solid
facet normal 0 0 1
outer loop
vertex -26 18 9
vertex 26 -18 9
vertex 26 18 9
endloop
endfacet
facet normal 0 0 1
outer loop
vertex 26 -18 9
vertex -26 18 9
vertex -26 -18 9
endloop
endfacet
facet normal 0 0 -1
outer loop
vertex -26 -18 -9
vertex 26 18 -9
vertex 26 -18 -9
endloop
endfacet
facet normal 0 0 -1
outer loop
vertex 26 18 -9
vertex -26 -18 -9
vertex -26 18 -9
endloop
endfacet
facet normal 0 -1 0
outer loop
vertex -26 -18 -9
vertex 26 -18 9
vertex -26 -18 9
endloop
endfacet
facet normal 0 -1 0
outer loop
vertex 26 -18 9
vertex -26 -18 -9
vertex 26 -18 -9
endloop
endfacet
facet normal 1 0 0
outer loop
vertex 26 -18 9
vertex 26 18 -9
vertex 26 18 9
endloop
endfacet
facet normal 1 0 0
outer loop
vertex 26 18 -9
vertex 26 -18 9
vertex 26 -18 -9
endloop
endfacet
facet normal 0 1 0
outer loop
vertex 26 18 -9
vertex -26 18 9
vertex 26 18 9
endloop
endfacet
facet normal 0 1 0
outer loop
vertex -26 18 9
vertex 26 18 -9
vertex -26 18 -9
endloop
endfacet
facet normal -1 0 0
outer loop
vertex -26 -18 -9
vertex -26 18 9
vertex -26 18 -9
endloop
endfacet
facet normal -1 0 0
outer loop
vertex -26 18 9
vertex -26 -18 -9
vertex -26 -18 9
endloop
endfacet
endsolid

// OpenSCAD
// ============================================================================
// Atom Lithography Machine — Parametric OpenSCAD Module (S6.10-01)
// ============================================================================
// part_id           : S6.10-01
// parent_bom_id     : S6.10
// subsystem         : S6
// part_name         : Yuksek-empedansli 3 kOhm NbTiN (L_sq=100 pH/sq) M4 kavite-QED veri yolu yongasi & NRE (Exp131)
// material          : OFHC Cu
// temp_stage        : 20 mK (MXC)
// vacuum_grade      : UHV / Kriyo-vakum
// tolerance         : ±5 nm genislik, ±5% L_sq
// computed_mass_kg  : 0.25106
// envelope_mm       : 62.200 x 36.000 x 17.900
// design_maturity   : M0_M1_DETAILED_CAD_DESIGN_ONLY
// no_lab_measurement: true
// iec61508_certified: false
// semi_s2_certified : false
// Units: millimeters (mm)
// ============================================================================

$fn = 64;

// Nominal bounding envelope parameters (mm)
bbox_x = 62.2000;
bbox_y = 36.0000;
bbox_z = 17.9000;

// Part-specific parametric dimensions
z_bus_ohm = 3000.0;
f_res_ghz = 5.0;
l_res_um = 300.0;
b_m4_t = 0.1785;

// Interface / port parameters (mm)

module part_S6_10_01() {
  union() {
    // 20 mK 3 kOhm NbTiN M4 cavity-QED bus package
    cube([52.000, 36.000, 18.000], center=true);
  }
}

// World assembly mounting transform (global machine frame, mm / deg):
// translate([-650.000, 58.000, 408.000]) rotate([0.000, 0.000, 0.000]) part_S6_10_01();

part_S6_10_01();
